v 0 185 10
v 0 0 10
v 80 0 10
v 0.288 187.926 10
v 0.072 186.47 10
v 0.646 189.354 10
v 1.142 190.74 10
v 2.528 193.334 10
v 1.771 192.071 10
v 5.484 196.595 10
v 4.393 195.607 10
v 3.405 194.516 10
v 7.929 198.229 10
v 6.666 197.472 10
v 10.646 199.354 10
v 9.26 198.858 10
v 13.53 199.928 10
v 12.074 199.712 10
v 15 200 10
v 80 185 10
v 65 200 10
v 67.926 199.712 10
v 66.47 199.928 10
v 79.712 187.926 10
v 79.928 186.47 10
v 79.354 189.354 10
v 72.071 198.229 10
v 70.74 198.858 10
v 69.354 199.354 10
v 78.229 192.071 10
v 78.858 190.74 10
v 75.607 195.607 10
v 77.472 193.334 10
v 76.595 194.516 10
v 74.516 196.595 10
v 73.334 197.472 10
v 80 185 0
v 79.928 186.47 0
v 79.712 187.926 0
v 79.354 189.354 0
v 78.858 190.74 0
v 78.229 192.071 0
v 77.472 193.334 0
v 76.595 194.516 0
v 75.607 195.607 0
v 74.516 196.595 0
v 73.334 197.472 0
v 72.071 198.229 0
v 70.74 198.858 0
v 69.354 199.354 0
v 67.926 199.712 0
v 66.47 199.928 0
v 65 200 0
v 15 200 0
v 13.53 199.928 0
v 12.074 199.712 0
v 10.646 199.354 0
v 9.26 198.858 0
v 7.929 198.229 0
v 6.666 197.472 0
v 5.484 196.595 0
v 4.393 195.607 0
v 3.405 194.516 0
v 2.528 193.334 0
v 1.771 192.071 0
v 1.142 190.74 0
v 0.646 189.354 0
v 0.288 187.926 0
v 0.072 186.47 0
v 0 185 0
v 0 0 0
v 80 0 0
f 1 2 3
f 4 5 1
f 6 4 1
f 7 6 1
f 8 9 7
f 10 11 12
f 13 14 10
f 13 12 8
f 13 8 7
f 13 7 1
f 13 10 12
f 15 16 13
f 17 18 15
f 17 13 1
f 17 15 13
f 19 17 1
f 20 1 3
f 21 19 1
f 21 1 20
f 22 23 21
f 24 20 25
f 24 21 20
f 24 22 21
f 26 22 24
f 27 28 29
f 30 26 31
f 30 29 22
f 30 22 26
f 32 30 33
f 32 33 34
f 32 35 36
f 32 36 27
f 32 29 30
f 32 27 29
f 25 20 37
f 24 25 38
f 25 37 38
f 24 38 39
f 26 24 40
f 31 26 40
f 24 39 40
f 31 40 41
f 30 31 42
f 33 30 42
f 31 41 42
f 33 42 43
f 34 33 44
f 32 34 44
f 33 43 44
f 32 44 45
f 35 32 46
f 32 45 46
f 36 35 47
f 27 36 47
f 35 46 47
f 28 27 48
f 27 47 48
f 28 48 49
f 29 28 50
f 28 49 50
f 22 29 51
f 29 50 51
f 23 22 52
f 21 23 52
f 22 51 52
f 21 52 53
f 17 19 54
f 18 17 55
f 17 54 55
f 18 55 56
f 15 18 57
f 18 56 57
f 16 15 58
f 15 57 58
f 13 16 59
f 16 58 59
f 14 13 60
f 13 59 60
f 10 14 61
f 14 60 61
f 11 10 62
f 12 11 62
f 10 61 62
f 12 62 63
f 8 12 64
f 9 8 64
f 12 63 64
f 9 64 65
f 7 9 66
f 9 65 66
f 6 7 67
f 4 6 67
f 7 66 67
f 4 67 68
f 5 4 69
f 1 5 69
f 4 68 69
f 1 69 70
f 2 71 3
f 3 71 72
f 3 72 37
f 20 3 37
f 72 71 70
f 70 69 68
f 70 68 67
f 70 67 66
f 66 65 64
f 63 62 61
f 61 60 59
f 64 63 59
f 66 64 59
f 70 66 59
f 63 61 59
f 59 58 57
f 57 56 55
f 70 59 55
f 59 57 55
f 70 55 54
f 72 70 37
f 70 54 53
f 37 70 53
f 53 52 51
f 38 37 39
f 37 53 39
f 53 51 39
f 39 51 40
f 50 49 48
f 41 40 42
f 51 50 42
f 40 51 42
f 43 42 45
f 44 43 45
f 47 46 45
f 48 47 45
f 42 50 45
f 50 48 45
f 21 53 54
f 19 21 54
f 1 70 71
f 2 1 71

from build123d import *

# Parameters (mm, degrees)
F1_DEPTH = 2.54
F4_DEPTH = 10


with BuildPart() as f1:
    # F0 (on Top) → F1 (new body)
    with BuildSketch(Plane.XY):
        with BuildLine():
            Line((11.0244164243, 29.6400431544), (0, 29.6400431544))
            Line((0, 29.6400431544), (-11.0244164243, 29.6400431544))
            add(Edge.make_bspline(
                [(-11.0244164243, 29.6400431544), (-19.7652843985, 29.6400431544), (-31.2645126812, 26.8662396786), (-34.4778372712, 15.8377015636), (-34.6175096929, 8.574783802)],
                knots=[0, 0, 0, 0, 0.5156604328, 1, 1, 1, 1], degree=3))
            Line((-34.6175096929, 8.574783802), (-34.6175096929, -34.9600836635))
            Line((-34.6175096929, -34.9600836635), (0, -34.9600836635))
            Line((0, -34.9600836635), (34.6175096929, -34.9600836635))
            Line((34.6175096929, -34.9600836635), (34.6175096929, 8.574783802))
            add(Edge.make_bspline(
                [(11.0244164243, 29.6400431544), (19.7652843985, 29.6400431544), (31.2645126812, 26.8662396786), (34.4778372712, 15.8377015636), (34.6175096929, 8.574783802)],
                knots=[0, 0, 0, 0, 0.5156604328, 1, 1, 1, 1], degree=3))
        make_face()
    extrude(amount=F1_DEPTH)


with BuildPart() as f4:
    # F3 (on Top) → F4 (new body)
    with BuildSketch(Plane.XY):
        with BuildLine():
            Line((0, 185), (0, 0))
            Line((0, 0), (80, 0))
            Line((80, 0), (80, 185))
            ThreePointArc((80, 185), (75.6066017178, 195.6066017178), (65, 200))
            Line((65, 200), (15, 200))
            ThreePointArc((15, 200), (4.3933982822, 195.6066017178), (0, 185))
        make_face()
    extrude(amount=F4_DEPTH)


solid = f4.part
